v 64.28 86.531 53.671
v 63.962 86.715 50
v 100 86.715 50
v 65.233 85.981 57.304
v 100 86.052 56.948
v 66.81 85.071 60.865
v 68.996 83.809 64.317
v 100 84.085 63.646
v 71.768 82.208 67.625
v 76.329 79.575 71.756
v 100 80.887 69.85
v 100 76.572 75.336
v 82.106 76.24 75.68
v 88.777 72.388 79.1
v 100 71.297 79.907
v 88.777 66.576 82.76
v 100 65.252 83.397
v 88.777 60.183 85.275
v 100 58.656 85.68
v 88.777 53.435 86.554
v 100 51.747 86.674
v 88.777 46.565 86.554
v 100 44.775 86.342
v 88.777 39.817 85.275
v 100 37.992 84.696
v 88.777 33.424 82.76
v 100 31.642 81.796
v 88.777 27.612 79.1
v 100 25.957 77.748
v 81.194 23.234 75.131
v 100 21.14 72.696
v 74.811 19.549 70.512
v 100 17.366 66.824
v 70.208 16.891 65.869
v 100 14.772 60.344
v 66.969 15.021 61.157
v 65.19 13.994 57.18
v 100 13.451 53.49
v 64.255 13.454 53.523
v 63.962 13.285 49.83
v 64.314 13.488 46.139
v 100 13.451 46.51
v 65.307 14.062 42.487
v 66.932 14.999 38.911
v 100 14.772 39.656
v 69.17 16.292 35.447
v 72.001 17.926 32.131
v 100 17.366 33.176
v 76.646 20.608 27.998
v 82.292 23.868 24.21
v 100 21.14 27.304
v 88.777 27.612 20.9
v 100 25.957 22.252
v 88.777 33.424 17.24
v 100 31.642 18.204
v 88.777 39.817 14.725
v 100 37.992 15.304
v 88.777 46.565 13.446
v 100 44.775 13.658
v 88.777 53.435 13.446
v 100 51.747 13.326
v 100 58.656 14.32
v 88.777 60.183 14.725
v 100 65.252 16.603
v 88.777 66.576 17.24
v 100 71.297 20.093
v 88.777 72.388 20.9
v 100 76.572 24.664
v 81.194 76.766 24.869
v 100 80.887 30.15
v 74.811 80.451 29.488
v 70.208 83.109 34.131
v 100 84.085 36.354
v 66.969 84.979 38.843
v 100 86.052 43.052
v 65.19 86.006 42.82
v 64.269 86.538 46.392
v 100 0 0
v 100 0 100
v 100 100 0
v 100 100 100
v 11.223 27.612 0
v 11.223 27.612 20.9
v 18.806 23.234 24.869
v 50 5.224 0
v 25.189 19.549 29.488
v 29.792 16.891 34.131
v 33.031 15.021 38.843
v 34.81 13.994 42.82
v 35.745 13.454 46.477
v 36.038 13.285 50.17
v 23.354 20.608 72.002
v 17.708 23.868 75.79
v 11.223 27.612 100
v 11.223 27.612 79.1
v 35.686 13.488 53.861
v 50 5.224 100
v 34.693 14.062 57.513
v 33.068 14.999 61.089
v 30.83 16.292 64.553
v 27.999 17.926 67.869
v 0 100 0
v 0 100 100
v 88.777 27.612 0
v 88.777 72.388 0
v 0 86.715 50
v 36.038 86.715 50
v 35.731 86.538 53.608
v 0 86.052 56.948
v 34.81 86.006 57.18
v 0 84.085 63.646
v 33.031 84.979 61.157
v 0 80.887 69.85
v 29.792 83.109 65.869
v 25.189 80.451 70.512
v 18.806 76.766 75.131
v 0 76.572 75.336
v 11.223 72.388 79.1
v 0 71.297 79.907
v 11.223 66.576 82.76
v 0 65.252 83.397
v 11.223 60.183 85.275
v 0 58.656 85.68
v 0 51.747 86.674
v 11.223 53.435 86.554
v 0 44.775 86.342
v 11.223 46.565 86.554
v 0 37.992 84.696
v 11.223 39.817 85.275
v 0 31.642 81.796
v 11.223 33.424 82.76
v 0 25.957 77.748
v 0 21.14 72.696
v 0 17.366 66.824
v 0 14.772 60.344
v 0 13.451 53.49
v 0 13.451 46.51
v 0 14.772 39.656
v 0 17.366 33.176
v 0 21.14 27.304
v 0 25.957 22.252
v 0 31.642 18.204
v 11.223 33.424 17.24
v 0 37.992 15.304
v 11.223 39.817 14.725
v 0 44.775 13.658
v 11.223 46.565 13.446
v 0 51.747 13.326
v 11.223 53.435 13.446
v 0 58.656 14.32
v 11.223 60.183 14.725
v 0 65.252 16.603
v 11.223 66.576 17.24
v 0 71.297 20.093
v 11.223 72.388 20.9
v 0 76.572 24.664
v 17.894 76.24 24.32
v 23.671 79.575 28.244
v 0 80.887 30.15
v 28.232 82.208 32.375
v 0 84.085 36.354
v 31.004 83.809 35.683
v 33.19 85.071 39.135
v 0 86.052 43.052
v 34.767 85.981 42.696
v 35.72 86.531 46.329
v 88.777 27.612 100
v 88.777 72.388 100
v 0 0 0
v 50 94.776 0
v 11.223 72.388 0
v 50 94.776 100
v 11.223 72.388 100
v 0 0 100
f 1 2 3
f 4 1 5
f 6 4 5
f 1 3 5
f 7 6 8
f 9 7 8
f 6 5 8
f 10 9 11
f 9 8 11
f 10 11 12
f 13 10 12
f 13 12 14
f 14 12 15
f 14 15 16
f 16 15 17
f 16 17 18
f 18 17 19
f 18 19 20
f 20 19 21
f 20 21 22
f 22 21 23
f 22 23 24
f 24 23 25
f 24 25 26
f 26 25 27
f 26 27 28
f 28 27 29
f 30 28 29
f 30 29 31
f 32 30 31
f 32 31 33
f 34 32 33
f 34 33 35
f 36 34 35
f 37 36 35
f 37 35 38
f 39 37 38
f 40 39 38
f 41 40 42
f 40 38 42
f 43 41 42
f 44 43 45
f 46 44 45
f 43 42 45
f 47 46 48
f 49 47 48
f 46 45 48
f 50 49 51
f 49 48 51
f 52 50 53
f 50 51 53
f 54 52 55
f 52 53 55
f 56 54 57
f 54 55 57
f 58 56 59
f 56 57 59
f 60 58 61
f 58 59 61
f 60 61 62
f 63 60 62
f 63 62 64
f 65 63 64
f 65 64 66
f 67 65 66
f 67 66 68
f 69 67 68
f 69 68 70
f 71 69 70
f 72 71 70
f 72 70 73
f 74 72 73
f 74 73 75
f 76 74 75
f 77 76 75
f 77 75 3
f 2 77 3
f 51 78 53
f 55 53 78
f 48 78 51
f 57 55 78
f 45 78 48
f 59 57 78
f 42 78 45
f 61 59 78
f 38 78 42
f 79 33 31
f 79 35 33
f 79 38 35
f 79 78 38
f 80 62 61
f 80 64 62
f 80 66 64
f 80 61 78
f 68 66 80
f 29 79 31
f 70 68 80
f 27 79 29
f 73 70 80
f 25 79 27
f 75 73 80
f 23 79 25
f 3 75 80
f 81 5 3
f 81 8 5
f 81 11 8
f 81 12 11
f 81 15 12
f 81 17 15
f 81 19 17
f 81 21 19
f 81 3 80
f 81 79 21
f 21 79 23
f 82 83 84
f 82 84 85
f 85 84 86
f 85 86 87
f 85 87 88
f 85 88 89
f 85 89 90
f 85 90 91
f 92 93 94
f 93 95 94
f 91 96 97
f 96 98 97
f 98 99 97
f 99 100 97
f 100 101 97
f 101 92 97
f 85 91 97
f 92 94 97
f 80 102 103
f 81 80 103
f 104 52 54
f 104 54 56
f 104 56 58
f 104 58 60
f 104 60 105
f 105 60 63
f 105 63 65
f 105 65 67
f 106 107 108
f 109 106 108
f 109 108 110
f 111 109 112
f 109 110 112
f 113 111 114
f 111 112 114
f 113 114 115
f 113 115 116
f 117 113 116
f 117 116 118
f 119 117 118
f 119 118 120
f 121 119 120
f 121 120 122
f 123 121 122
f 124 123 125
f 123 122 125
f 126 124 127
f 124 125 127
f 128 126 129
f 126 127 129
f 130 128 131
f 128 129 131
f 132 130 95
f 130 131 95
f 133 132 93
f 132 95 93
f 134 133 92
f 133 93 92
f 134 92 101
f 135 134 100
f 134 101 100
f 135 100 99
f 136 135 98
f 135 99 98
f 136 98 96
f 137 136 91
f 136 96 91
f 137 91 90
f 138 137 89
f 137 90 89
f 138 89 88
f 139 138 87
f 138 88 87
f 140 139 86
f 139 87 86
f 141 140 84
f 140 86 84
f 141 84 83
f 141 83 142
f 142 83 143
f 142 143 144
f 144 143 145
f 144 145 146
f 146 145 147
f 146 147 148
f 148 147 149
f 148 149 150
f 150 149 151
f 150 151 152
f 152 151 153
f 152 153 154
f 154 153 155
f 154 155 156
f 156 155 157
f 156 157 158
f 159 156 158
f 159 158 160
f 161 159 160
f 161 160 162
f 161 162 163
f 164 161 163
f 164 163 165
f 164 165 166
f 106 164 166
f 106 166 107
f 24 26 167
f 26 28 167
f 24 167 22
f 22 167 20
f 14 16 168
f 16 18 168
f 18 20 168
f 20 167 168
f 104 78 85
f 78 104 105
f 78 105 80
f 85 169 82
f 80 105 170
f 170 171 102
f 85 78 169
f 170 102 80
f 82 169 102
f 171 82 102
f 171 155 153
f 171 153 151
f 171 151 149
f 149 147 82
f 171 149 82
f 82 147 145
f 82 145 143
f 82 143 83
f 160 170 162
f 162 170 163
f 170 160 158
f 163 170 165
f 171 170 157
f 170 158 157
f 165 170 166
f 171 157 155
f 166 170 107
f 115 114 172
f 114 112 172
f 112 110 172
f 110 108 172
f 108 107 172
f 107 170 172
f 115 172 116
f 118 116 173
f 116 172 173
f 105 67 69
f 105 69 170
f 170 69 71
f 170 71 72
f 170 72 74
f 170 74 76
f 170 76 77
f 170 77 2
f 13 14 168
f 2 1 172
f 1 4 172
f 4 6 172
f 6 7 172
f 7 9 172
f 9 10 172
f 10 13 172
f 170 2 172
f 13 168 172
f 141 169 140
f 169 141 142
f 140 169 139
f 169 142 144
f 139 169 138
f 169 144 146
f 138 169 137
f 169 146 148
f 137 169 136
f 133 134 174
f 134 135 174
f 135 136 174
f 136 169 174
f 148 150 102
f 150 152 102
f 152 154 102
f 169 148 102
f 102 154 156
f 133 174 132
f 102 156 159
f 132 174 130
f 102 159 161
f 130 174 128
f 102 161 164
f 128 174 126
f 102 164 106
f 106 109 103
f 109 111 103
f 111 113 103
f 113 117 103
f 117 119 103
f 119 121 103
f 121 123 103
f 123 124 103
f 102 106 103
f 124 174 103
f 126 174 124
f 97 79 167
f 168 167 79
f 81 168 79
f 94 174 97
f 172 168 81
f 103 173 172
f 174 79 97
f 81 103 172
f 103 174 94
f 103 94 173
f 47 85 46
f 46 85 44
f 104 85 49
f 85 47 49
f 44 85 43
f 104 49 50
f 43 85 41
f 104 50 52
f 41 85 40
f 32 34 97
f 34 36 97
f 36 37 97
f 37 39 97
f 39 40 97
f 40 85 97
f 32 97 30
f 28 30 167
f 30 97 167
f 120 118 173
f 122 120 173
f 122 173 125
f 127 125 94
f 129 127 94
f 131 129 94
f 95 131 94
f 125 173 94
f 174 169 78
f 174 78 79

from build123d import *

# Parameters (mm, degrees)
F0_W     = 100
F0_H     = 100
F1_DEPTH = 100
F2_R     = 36.715215
F3_DEPTH = 100
F5_DEPTH = 100.001


with BuildPart() as f1:
    # F0 (on Right) → F1 (new body)
    with BuildSketch(Plane.YZ):
        with Locations((50, 50)):
            Rectangle(F0_W, F0_H)
    extrude(amount=F1_DEPTH)

    # F2 (on face) → F3 (cut, through all)
    with BuildSketch(Plane.YZ.offset(100)):
        with Locations((50, 50)):
            Circle(F2_R)
    extrude(amount=-F3_DEPTH, mode=Mode.SUBTRACT)

    # F4 (on face) → F5 (cut, through all)
    with BuildSketch(Plane.XY.offset(100)):
        Polygon((88.777177, 27.611986), (88.777177, 72.388014), (50, 94.776027), (11.222823, 72.388014), (11.222823, 27.611986), (50, 5.223973), align=None)
    extrude(amount=-F5_DEPTH, mode=Mode.SUBTRACT)


solid = f1.part
